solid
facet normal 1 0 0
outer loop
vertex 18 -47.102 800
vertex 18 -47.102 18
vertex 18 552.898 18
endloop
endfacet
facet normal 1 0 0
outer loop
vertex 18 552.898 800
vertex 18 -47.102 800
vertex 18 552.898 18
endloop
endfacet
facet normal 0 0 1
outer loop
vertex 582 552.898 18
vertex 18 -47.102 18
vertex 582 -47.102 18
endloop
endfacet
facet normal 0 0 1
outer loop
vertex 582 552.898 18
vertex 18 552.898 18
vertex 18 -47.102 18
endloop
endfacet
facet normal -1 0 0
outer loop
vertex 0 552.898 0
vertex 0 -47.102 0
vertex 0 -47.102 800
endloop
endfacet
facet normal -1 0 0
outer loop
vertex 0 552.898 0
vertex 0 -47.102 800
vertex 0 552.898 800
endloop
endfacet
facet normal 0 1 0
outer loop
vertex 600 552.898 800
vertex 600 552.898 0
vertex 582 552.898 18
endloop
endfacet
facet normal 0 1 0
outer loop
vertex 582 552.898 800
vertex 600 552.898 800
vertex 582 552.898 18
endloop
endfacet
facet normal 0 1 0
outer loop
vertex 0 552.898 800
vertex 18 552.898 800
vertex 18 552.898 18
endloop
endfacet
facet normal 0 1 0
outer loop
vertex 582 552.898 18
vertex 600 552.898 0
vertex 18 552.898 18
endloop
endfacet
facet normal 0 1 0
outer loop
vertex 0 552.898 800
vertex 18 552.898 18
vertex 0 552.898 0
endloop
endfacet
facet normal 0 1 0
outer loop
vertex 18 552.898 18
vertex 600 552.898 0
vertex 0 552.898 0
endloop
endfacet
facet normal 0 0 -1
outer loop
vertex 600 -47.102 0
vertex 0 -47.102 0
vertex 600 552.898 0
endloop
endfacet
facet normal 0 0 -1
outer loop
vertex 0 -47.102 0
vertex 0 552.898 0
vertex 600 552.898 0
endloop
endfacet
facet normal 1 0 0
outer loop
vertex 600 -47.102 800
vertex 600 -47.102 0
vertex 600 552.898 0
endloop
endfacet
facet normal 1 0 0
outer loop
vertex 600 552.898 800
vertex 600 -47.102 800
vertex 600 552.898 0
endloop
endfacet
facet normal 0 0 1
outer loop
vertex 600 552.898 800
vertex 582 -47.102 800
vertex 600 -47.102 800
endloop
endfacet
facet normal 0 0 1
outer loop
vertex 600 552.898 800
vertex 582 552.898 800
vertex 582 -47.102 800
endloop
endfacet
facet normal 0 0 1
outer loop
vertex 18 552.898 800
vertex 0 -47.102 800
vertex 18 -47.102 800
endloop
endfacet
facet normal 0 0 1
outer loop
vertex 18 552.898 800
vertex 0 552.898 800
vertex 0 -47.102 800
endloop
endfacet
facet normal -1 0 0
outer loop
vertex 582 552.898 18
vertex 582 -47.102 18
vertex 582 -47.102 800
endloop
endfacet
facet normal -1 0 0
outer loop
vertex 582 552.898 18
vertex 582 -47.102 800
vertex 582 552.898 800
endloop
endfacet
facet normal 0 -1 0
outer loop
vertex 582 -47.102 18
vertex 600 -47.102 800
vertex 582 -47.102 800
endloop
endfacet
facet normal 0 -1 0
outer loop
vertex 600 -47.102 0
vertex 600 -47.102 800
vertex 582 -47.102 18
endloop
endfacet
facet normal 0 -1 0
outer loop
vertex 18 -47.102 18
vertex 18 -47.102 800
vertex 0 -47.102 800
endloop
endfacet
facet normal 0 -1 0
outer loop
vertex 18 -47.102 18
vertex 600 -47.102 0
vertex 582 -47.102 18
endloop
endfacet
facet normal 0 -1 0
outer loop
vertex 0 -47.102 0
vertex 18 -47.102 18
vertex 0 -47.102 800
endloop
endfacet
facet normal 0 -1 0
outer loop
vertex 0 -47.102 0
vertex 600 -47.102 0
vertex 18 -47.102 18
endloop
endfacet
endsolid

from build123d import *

# Parameters (mm, degrees)
F0_W     = 50.3577142954
F0_H     = 47.1017286181
F1_DEPTH = 800
F2_DEPTH = 600
F3_DEPTH = 600
F4_T     = -18
F5_DEPTH = 80
F6_DEPTH = 25
F7_DEPTH = 80


with BuildPart() as f1:
    # F0 (on Top) → F1 (new body)
    with BuildSketch(Plane.XY):
        with Locations((25.1788571477, -23.5508643091)):
            Rectangle(F0_W, F0_H)
    extrude(amount=F1_DEPTH)

    # F2 (add): a face of the model
    f2_faces = [f1.faces().sort_by_distance(p)[0] for p in [
        (0, -23.5508643091, 400),
    ]]
    extrude(f2_faces, amount=-F2_DEPTH)

    # F3 (add): a face of the model
    f3_faces = [f1.faces().sort_by_distance(p)[0] for p in [
        (300, -47.1017286181, 400),
    ]]
    extrude(f3_faces, amount=-F3_DEPTH)

    # F4
    f4_openings = [f1.faces().sort_by_distance(p)[0] for p in [
        (300, 252.898271, 800),
        (300, -47.101729, 400),
    ]]
    offset(amount=F4_T, openings=f4_openings)

    # F5 (add): a face of the model
    f5_faces = [f1.faces().sort_by_distance(p)[0] for p in [
        (9, -38.6164472439, 800),
    ]]
    extrude(f5_faces, amount=F5_DEPTH)

    # F6 (cut): a face of the model
    f6_faces = [f1.faces().sort_by_distance(p)[0] for p in [
        (300, 534.8982713819, 449),
    ]]
    extrude(f6_faces, amount=-F6_DEPTH, mode=Mode.SUBTRACT)

    # F7 (cut): faces of the model
    f7_faces = [f1.faces().sort_by_distance(p)[0] for p in [
        (591, 252.8982713819, 880),
        (9, 252.8982713819, 880),
    ]]
    extrude(f7_faces, amount=-F7_DEPTH, mode=Mode.SUBTRACT)


solid = f1.part
